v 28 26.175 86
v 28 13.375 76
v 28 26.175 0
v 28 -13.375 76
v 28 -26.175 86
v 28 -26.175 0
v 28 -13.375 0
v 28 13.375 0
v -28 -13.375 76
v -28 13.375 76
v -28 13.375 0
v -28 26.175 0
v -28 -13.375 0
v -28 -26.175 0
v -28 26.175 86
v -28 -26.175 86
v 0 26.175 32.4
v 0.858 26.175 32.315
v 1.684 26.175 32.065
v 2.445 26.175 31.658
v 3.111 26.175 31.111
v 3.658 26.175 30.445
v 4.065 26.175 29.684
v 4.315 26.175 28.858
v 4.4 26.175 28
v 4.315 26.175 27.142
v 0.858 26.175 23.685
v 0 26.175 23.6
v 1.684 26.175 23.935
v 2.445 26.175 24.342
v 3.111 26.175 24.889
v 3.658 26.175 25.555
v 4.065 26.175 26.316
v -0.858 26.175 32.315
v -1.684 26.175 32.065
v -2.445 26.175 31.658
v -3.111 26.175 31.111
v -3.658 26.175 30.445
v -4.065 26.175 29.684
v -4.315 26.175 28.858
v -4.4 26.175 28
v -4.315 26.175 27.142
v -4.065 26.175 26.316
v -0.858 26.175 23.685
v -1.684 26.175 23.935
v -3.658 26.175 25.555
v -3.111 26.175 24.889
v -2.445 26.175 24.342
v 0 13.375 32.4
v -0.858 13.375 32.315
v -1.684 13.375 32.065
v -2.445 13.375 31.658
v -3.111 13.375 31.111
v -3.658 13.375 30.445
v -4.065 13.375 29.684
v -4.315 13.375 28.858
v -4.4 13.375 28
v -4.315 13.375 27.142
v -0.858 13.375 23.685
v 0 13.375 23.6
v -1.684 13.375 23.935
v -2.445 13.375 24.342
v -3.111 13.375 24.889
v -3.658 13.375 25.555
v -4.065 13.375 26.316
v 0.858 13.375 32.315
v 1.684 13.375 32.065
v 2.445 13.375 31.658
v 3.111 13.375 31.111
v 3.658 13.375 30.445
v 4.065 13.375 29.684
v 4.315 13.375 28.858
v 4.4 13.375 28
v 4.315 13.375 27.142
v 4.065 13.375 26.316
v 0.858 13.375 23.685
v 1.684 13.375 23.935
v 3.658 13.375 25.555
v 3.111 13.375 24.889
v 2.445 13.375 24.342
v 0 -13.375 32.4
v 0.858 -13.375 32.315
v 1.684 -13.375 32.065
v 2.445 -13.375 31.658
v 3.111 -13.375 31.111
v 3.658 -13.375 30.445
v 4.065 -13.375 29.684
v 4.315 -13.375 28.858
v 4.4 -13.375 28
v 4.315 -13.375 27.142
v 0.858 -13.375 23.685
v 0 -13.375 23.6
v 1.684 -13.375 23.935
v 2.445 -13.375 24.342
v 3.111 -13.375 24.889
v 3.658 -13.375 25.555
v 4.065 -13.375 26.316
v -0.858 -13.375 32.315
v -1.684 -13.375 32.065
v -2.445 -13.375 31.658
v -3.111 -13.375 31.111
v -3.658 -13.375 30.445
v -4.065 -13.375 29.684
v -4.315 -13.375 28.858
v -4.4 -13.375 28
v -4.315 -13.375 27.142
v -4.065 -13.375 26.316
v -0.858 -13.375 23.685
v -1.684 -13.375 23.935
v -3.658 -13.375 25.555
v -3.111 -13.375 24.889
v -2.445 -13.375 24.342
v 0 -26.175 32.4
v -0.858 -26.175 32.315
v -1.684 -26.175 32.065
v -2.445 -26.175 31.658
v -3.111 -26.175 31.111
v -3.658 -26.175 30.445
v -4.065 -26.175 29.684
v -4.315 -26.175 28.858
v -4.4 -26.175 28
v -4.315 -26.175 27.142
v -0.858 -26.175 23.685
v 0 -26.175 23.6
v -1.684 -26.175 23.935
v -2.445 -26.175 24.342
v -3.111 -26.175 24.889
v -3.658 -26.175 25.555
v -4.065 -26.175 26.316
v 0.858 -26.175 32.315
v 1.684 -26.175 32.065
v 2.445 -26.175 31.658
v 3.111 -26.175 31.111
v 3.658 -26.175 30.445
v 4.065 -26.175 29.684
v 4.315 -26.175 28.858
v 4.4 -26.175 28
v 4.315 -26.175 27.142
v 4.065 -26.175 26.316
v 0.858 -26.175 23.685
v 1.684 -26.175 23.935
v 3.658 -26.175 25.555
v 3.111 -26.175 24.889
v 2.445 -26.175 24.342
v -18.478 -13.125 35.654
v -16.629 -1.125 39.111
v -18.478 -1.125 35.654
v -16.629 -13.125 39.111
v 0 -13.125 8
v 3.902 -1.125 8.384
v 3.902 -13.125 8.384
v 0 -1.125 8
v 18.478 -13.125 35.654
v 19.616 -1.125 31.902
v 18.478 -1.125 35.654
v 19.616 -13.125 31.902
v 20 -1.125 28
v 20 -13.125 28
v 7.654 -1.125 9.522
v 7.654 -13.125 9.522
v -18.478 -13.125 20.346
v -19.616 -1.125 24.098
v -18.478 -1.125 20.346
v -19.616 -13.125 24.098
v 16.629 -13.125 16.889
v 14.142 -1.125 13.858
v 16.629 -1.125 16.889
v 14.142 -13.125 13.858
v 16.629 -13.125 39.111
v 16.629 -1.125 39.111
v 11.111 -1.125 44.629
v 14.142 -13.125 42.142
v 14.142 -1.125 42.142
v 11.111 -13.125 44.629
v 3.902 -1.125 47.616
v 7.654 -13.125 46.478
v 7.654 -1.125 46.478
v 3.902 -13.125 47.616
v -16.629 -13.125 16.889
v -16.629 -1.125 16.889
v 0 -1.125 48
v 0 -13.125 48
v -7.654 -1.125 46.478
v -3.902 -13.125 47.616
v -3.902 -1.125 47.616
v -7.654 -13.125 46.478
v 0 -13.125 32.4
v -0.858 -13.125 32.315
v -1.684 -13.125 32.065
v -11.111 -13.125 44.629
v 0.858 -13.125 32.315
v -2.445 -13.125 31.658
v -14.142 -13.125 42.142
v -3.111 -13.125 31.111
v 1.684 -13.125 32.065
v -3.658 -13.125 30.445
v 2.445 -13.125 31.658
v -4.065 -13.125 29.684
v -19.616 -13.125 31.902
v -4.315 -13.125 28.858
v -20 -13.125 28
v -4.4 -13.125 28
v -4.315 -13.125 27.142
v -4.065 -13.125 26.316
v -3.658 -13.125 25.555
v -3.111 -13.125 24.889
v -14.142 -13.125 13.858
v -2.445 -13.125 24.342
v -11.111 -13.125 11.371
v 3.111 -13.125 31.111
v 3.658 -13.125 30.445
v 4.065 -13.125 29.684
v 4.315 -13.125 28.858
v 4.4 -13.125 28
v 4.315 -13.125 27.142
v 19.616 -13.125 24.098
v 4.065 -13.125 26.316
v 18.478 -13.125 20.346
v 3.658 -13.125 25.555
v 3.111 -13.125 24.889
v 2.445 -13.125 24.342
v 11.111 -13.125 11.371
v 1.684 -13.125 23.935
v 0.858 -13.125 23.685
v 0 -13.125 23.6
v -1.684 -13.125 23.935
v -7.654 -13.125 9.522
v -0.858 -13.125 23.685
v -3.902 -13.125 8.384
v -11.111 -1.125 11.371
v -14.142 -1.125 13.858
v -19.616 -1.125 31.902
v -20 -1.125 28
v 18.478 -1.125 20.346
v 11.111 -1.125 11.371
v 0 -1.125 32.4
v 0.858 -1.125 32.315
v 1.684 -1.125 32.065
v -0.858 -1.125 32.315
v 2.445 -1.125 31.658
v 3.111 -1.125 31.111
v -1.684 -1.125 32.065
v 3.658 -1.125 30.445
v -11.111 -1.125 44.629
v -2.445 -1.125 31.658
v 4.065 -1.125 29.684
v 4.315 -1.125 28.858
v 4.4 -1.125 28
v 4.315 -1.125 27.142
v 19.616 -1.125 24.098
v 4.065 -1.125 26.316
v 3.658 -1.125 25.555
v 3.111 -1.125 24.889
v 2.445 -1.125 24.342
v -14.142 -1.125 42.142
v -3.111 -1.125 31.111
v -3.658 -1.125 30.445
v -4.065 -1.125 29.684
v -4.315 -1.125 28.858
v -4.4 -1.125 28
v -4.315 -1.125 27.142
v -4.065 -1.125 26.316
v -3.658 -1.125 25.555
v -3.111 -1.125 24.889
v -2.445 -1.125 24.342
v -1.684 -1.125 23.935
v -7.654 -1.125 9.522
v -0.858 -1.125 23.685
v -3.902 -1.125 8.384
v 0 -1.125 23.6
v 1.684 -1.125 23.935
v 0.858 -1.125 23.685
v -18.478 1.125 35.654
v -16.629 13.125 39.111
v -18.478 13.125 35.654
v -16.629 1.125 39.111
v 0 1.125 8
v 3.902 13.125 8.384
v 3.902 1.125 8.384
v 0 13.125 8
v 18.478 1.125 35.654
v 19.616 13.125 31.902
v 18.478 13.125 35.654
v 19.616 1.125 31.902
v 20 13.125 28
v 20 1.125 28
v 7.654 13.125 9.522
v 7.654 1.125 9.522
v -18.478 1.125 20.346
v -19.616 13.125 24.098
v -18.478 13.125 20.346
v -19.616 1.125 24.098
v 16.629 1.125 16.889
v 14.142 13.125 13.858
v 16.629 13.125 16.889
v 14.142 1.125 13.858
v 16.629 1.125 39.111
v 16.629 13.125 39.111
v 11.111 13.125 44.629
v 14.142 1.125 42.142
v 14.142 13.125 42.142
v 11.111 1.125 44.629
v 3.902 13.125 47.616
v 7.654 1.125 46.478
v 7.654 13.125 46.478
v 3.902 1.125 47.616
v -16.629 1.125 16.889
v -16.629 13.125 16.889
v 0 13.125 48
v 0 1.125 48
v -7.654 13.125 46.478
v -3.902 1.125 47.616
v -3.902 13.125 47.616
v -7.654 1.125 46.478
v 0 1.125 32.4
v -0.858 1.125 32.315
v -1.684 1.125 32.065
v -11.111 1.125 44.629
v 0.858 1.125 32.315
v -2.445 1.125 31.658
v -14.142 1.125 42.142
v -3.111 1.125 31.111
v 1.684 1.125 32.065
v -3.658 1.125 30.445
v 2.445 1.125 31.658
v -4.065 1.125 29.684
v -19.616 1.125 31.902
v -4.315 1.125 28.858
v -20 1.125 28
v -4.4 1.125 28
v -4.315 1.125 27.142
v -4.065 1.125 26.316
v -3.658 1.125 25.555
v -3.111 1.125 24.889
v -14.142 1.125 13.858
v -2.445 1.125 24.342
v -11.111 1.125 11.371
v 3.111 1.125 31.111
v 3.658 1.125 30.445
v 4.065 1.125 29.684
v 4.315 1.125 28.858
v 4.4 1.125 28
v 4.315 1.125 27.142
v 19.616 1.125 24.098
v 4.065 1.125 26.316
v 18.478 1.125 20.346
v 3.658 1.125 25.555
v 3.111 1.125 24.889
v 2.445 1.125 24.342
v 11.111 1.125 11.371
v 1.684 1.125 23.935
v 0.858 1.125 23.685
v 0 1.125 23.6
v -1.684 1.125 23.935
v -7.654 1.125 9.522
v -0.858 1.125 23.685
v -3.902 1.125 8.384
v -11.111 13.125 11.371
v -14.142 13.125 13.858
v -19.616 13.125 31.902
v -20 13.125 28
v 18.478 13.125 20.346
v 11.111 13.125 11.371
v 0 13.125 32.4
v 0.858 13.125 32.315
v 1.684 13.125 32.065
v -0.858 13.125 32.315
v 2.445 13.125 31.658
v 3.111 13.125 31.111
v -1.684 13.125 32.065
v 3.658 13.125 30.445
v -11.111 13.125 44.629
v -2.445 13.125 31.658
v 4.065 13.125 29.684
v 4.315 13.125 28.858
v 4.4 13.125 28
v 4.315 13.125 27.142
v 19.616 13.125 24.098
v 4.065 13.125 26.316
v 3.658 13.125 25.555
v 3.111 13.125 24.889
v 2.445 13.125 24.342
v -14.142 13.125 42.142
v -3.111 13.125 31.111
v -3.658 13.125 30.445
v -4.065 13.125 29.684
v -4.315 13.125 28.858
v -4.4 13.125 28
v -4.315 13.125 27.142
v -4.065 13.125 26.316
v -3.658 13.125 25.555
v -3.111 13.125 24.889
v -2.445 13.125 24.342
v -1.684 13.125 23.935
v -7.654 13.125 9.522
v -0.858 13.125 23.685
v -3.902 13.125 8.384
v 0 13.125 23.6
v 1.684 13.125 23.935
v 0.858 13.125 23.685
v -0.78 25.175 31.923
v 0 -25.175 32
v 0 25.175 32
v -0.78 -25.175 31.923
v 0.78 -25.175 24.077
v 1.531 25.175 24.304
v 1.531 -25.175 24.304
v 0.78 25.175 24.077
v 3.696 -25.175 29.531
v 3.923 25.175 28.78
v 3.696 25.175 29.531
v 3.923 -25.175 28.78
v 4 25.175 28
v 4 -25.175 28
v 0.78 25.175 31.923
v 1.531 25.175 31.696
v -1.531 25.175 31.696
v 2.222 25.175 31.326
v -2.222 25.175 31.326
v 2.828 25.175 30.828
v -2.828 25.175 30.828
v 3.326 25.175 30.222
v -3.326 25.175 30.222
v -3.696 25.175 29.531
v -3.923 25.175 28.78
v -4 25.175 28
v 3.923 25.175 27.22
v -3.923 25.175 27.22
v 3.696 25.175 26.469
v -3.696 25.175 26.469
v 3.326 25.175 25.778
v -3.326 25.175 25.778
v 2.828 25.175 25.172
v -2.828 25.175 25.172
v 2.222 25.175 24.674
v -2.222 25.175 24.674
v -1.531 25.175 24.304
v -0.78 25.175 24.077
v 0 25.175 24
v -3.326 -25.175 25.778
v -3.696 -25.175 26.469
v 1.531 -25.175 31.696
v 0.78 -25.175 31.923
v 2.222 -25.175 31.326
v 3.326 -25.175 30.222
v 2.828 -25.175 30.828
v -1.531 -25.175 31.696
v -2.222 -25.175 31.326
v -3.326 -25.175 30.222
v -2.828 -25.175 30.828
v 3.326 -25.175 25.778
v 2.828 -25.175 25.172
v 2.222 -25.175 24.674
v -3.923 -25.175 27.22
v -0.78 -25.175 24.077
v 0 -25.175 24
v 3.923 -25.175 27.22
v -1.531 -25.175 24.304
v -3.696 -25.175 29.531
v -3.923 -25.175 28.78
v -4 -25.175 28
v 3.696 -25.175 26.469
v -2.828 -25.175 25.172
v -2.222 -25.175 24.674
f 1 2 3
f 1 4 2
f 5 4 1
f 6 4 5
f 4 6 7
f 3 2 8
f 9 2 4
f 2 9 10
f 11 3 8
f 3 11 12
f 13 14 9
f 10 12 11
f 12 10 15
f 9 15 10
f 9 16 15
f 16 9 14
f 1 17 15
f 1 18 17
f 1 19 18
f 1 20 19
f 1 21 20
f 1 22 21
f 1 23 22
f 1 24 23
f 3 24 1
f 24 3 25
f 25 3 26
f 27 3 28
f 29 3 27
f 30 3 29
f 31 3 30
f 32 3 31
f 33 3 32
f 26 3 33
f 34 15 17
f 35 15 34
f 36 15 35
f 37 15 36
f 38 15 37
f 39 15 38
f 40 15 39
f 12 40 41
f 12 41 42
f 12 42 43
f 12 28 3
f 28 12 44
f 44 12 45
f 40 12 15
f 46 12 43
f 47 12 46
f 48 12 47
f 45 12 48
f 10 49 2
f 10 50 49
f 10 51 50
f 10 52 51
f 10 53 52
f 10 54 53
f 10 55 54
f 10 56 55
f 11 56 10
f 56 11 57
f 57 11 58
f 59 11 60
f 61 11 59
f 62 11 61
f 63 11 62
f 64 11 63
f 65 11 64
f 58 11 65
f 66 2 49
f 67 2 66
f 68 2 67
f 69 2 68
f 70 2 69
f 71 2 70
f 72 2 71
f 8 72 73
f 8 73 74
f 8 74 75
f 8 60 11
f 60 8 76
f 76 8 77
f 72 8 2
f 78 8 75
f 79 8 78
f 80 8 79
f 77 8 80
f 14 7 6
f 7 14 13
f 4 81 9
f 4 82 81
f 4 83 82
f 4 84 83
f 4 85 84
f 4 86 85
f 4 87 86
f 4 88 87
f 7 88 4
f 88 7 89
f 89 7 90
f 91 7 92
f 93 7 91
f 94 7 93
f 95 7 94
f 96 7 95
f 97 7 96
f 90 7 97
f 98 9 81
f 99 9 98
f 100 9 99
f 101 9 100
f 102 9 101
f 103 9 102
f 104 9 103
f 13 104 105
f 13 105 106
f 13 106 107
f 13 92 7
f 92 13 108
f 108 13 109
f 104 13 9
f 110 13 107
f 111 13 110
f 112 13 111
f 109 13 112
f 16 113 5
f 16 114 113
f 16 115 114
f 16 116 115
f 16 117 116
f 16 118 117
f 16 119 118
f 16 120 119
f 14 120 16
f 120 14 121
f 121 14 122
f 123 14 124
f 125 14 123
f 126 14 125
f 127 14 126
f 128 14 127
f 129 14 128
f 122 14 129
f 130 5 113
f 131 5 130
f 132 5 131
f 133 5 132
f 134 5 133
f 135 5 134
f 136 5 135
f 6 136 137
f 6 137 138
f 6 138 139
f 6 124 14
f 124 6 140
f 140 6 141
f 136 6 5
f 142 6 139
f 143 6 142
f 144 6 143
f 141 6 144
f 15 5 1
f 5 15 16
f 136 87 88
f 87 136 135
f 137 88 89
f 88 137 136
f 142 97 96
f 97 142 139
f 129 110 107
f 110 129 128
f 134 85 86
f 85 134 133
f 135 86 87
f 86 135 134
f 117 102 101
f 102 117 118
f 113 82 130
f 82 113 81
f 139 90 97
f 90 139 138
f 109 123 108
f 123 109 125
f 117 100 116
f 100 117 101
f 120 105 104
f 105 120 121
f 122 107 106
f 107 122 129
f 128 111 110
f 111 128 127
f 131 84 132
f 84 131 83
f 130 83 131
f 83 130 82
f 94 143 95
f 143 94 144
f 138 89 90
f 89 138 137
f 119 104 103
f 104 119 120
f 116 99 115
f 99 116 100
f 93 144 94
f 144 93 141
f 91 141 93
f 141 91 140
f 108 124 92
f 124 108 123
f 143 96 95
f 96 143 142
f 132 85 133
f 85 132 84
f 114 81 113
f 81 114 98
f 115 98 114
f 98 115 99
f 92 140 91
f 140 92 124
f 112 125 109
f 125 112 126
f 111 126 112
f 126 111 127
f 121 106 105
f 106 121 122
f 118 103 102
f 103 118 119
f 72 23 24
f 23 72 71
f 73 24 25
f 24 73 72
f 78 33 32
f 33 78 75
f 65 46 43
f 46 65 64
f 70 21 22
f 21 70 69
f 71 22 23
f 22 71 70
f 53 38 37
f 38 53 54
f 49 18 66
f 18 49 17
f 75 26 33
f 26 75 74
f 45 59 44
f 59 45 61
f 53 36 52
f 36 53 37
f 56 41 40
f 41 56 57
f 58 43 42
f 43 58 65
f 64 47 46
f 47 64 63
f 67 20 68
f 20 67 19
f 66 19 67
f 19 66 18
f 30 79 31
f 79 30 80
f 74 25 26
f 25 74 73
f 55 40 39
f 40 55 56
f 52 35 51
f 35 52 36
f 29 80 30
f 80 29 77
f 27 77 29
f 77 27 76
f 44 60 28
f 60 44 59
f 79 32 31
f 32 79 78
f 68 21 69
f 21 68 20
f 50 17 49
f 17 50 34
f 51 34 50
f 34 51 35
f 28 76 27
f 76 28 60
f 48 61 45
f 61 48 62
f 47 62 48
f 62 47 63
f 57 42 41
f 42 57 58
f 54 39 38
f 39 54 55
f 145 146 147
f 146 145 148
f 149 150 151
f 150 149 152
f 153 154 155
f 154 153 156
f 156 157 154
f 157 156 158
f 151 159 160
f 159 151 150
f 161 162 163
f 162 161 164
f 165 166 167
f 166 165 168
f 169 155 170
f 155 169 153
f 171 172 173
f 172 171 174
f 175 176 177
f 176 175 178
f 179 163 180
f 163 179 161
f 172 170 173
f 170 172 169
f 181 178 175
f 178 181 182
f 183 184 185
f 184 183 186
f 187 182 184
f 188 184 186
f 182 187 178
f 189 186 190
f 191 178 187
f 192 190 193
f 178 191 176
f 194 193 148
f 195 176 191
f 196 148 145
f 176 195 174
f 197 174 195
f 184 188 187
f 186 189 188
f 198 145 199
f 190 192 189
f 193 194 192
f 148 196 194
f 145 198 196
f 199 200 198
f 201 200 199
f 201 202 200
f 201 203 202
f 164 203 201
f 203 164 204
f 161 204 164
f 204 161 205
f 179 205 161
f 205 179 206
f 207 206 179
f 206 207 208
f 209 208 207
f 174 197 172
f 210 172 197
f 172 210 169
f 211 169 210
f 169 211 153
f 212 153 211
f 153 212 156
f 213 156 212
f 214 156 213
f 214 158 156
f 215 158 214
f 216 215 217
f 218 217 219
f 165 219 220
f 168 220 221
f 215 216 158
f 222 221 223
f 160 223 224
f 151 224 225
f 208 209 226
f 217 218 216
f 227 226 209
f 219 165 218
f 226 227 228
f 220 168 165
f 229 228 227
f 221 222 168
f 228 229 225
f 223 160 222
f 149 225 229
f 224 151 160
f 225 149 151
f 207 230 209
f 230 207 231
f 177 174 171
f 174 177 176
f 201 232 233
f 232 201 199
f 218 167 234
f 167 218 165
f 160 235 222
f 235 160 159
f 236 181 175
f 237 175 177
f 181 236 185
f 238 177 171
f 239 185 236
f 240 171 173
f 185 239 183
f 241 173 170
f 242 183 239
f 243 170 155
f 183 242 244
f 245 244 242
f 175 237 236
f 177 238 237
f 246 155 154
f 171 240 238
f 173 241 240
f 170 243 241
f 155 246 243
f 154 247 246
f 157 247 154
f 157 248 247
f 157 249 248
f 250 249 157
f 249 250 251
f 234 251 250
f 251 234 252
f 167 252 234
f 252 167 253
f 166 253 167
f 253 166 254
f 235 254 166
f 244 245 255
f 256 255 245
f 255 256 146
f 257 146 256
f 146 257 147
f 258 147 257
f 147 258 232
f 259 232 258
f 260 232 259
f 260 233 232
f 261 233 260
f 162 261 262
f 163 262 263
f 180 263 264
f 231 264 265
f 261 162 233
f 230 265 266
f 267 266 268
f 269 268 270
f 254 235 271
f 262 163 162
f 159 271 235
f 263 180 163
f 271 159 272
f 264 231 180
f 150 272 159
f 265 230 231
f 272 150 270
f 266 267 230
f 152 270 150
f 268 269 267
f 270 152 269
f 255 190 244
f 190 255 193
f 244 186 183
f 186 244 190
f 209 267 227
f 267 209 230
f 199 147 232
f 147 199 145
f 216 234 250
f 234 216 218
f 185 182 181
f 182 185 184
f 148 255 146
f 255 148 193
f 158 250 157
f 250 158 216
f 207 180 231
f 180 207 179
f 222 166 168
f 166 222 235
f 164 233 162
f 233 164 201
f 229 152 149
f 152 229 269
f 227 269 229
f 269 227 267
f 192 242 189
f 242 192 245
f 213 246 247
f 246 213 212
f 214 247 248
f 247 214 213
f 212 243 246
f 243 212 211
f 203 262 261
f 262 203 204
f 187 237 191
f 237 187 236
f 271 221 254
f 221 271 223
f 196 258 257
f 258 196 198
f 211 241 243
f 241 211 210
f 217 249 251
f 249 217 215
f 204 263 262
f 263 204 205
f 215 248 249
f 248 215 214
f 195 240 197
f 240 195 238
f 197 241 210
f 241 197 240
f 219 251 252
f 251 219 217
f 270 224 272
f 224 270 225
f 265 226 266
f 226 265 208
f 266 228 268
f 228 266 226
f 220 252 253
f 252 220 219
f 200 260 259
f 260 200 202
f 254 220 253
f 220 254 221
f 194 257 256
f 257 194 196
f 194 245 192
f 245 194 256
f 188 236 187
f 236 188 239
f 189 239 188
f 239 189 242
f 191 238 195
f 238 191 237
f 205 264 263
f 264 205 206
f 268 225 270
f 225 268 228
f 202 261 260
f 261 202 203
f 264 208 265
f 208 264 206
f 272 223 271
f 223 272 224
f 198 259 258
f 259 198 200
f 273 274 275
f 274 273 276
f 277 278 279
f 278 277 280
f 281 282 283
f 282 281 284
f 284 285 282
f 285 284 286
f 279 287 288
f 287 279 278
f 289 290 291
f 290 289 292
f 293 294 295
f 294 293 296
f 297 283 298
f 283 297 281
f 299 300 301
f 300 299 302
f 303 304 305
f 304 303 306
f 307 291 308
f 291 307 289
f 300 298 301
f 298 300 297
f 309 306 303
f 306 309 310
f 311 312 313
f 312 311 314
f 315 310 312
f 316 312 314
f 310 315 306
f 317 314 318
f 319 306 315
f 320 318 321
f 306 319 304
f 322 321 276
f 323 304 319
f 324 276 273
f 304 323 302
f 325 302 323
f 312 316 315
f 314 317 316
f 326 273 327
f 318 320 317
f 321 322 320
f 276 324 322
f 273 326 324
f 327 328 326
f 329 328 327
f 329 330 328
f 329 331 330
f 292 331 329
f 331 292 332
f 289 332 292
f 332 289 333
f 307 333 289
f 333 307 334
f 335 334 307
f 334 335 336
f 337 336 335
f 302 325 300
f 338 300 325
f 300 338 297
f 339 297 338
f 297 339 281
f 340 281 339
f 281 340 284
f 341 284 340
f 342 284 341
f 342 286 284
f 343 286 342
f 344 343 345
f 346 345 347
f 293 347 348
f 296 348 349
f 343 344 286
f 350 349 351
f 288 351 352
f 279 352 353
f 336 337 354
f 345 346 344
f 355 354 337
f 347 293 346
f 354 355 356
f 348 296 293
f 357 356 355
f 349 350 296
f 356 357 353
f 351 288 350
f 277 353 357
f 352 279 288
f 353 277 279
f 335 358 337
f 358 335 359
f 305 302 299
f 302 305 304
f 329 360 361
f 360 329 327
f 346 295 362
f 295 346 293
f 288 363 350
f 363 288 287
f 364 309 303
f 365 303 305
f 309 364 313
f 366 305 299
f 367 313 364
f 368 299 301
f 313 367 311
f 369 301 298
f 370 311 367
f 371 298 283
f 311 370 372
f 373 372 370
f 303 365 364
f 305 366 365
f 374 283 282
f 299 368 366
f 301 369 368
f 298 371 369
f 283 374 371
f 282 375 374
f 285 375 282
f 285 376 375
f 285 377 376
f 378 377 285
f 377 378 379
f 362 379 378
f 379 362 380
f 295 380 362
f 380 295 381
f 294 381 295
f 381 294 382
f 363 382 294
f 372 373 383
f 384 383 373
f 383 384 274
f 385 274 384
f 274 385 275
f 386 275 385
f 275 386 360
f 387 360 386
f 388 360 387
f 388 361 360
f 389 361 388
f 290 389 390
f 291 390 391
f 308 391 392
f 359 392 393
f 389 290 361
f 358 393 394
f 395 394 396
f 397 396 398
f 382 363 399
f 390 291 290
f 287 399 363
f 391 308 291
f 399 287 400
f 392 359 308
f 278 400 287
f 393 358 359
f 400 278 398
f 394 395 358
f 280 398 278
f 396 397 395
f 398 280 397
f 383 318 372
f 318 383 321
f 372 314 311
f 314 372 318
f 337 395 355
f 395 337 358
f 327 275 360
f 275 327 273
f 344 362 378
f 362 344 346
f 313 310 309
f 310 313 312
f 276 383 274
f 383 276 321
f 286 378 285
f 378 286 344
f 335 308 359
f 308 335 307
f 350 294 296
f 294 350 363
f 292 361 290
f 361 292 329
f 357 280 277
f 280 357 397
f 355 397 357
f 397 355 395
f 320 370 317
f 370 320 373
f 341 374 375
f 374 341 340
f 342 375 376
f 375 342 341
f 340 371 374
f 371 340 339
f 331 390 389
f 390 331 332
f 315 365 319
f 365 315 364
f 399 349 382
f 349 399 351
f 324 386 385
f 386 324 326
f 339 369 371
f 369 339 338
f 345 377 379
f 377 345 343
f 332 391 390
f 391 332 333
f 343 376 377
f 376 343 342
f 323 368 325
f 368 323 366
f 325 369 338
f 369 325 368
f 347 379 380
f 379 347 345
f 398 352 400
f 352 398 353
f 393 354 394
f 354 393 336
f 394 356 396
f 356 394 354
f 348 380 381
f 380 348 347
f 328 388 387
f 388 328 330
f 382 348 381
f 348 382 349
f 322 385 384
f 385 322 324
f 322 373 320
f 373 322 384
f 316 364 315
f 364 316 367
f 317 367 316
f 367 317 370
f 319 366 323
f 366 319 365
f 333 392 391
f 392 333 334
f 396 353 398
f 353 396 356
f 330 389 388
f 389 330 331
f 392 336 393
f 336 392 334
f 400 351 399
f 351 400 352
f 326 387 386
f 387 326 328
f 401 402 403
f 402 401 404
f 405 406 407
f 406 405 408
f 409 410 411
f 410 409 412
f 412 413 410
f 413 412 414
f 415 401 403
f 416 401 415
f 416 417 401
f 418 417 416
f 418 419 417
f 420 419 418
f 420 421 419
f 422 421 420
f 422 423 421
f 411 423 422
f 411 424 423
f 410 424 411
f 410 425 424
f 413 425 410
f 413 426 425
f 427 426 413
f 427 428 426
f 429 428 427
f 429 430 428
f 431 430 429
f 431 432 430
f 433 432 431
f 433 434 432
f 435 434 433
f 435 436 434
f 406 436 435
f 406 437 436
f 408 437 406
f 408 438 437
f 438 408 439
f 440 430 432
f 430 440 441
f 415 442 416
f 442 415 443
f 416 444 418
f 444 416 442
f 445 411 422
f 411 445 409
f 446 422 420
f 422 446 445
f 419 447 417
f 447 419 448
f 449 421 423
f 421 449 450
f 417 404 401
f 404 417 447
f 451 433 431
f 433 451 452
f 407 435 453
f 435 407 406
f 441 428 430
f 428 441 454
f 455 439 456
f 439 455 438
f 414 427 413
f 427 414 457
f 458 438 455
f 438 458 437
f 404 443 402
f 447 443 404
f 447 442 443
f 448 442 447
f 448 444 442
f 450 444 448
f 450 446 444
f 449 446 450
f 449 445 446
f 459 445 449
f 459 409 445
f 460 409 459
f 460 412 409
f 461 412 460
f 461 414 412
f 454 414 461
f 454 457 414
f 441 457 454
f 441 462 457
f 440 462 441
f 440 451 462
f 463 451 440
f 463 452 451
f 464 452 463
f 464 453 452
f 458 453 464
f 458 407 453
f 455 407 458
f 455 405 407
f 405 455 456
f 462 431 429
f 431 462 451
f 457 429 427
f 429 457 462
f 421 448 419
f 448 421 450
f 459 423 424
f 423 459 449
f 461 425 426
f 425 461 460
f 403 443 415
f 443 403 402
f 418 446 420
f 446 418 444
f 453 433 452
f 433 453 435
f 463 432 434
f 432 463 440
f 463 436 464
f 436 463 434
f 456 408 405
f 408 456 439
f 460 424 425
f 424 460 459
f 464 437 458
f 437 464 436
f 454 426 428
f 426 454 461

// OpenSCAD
$fn = 32;

// ------------------------------------------------------------------------
// Trolley wheel set: wheels d40, fork 76 mm tall
// Every part is its own module, assembly() places every instance.
// ------------------------------------------------------------------------

// --- part 1 ---
module trolley_fork() {
  difference() {
    union() {
      translate([-28, 13.375, 0]) cube([56, 12.8, 76]);
      translate([-28, -26.175, 0]) cube([56, 12.8, 76]);
      translate([-28, -26.175, 76]) cube([56, 52.35, 10]);
    }
    translate([0, -19.775, 28]) rotate([90, 0, 0]) cylinder(h = 14.8, d = 8.8, center = true);
    translate([0, 19.775, 28]) rotate([90, 0, 0]) cylinder(h = 14.8, d = 8.8, center = true);
  }
}

// --- part 2 ---
module trolley_wheel() {
  difference() {
      translate([0, 0, 0]) cylinder(h = 12, d = 40);
      translate([0, 0, -1]) cylinder(h = 14, d = 8.8);
    }
}

// --- part 3 ---
module trolley_axle() {
  translate([0, 0, -25.175]) cylinder(h = 50.35, d = 8);
}

// --- assembly ---
module assembly() {
  color([0.80, 0.24, 0.20]) translate([0, 0, 0]) rotate([0, 0, 0]) trolley_fork();
  color([0.20, 0.45, 0.75]) translate([0, -1.125, 28]) rotate([90, 0, 0]) trolley_wheel();
  color([0.25, 0.62, 0.32]) translate([0, 13.125, 28]) rotate([90, 0, 0]) trolley_wheel();
  color([0.92, 0.70, 0.18]) translate([0, 0, 28]) rotate([90, 0, 0]) trolley_axle();
}

assembly();
